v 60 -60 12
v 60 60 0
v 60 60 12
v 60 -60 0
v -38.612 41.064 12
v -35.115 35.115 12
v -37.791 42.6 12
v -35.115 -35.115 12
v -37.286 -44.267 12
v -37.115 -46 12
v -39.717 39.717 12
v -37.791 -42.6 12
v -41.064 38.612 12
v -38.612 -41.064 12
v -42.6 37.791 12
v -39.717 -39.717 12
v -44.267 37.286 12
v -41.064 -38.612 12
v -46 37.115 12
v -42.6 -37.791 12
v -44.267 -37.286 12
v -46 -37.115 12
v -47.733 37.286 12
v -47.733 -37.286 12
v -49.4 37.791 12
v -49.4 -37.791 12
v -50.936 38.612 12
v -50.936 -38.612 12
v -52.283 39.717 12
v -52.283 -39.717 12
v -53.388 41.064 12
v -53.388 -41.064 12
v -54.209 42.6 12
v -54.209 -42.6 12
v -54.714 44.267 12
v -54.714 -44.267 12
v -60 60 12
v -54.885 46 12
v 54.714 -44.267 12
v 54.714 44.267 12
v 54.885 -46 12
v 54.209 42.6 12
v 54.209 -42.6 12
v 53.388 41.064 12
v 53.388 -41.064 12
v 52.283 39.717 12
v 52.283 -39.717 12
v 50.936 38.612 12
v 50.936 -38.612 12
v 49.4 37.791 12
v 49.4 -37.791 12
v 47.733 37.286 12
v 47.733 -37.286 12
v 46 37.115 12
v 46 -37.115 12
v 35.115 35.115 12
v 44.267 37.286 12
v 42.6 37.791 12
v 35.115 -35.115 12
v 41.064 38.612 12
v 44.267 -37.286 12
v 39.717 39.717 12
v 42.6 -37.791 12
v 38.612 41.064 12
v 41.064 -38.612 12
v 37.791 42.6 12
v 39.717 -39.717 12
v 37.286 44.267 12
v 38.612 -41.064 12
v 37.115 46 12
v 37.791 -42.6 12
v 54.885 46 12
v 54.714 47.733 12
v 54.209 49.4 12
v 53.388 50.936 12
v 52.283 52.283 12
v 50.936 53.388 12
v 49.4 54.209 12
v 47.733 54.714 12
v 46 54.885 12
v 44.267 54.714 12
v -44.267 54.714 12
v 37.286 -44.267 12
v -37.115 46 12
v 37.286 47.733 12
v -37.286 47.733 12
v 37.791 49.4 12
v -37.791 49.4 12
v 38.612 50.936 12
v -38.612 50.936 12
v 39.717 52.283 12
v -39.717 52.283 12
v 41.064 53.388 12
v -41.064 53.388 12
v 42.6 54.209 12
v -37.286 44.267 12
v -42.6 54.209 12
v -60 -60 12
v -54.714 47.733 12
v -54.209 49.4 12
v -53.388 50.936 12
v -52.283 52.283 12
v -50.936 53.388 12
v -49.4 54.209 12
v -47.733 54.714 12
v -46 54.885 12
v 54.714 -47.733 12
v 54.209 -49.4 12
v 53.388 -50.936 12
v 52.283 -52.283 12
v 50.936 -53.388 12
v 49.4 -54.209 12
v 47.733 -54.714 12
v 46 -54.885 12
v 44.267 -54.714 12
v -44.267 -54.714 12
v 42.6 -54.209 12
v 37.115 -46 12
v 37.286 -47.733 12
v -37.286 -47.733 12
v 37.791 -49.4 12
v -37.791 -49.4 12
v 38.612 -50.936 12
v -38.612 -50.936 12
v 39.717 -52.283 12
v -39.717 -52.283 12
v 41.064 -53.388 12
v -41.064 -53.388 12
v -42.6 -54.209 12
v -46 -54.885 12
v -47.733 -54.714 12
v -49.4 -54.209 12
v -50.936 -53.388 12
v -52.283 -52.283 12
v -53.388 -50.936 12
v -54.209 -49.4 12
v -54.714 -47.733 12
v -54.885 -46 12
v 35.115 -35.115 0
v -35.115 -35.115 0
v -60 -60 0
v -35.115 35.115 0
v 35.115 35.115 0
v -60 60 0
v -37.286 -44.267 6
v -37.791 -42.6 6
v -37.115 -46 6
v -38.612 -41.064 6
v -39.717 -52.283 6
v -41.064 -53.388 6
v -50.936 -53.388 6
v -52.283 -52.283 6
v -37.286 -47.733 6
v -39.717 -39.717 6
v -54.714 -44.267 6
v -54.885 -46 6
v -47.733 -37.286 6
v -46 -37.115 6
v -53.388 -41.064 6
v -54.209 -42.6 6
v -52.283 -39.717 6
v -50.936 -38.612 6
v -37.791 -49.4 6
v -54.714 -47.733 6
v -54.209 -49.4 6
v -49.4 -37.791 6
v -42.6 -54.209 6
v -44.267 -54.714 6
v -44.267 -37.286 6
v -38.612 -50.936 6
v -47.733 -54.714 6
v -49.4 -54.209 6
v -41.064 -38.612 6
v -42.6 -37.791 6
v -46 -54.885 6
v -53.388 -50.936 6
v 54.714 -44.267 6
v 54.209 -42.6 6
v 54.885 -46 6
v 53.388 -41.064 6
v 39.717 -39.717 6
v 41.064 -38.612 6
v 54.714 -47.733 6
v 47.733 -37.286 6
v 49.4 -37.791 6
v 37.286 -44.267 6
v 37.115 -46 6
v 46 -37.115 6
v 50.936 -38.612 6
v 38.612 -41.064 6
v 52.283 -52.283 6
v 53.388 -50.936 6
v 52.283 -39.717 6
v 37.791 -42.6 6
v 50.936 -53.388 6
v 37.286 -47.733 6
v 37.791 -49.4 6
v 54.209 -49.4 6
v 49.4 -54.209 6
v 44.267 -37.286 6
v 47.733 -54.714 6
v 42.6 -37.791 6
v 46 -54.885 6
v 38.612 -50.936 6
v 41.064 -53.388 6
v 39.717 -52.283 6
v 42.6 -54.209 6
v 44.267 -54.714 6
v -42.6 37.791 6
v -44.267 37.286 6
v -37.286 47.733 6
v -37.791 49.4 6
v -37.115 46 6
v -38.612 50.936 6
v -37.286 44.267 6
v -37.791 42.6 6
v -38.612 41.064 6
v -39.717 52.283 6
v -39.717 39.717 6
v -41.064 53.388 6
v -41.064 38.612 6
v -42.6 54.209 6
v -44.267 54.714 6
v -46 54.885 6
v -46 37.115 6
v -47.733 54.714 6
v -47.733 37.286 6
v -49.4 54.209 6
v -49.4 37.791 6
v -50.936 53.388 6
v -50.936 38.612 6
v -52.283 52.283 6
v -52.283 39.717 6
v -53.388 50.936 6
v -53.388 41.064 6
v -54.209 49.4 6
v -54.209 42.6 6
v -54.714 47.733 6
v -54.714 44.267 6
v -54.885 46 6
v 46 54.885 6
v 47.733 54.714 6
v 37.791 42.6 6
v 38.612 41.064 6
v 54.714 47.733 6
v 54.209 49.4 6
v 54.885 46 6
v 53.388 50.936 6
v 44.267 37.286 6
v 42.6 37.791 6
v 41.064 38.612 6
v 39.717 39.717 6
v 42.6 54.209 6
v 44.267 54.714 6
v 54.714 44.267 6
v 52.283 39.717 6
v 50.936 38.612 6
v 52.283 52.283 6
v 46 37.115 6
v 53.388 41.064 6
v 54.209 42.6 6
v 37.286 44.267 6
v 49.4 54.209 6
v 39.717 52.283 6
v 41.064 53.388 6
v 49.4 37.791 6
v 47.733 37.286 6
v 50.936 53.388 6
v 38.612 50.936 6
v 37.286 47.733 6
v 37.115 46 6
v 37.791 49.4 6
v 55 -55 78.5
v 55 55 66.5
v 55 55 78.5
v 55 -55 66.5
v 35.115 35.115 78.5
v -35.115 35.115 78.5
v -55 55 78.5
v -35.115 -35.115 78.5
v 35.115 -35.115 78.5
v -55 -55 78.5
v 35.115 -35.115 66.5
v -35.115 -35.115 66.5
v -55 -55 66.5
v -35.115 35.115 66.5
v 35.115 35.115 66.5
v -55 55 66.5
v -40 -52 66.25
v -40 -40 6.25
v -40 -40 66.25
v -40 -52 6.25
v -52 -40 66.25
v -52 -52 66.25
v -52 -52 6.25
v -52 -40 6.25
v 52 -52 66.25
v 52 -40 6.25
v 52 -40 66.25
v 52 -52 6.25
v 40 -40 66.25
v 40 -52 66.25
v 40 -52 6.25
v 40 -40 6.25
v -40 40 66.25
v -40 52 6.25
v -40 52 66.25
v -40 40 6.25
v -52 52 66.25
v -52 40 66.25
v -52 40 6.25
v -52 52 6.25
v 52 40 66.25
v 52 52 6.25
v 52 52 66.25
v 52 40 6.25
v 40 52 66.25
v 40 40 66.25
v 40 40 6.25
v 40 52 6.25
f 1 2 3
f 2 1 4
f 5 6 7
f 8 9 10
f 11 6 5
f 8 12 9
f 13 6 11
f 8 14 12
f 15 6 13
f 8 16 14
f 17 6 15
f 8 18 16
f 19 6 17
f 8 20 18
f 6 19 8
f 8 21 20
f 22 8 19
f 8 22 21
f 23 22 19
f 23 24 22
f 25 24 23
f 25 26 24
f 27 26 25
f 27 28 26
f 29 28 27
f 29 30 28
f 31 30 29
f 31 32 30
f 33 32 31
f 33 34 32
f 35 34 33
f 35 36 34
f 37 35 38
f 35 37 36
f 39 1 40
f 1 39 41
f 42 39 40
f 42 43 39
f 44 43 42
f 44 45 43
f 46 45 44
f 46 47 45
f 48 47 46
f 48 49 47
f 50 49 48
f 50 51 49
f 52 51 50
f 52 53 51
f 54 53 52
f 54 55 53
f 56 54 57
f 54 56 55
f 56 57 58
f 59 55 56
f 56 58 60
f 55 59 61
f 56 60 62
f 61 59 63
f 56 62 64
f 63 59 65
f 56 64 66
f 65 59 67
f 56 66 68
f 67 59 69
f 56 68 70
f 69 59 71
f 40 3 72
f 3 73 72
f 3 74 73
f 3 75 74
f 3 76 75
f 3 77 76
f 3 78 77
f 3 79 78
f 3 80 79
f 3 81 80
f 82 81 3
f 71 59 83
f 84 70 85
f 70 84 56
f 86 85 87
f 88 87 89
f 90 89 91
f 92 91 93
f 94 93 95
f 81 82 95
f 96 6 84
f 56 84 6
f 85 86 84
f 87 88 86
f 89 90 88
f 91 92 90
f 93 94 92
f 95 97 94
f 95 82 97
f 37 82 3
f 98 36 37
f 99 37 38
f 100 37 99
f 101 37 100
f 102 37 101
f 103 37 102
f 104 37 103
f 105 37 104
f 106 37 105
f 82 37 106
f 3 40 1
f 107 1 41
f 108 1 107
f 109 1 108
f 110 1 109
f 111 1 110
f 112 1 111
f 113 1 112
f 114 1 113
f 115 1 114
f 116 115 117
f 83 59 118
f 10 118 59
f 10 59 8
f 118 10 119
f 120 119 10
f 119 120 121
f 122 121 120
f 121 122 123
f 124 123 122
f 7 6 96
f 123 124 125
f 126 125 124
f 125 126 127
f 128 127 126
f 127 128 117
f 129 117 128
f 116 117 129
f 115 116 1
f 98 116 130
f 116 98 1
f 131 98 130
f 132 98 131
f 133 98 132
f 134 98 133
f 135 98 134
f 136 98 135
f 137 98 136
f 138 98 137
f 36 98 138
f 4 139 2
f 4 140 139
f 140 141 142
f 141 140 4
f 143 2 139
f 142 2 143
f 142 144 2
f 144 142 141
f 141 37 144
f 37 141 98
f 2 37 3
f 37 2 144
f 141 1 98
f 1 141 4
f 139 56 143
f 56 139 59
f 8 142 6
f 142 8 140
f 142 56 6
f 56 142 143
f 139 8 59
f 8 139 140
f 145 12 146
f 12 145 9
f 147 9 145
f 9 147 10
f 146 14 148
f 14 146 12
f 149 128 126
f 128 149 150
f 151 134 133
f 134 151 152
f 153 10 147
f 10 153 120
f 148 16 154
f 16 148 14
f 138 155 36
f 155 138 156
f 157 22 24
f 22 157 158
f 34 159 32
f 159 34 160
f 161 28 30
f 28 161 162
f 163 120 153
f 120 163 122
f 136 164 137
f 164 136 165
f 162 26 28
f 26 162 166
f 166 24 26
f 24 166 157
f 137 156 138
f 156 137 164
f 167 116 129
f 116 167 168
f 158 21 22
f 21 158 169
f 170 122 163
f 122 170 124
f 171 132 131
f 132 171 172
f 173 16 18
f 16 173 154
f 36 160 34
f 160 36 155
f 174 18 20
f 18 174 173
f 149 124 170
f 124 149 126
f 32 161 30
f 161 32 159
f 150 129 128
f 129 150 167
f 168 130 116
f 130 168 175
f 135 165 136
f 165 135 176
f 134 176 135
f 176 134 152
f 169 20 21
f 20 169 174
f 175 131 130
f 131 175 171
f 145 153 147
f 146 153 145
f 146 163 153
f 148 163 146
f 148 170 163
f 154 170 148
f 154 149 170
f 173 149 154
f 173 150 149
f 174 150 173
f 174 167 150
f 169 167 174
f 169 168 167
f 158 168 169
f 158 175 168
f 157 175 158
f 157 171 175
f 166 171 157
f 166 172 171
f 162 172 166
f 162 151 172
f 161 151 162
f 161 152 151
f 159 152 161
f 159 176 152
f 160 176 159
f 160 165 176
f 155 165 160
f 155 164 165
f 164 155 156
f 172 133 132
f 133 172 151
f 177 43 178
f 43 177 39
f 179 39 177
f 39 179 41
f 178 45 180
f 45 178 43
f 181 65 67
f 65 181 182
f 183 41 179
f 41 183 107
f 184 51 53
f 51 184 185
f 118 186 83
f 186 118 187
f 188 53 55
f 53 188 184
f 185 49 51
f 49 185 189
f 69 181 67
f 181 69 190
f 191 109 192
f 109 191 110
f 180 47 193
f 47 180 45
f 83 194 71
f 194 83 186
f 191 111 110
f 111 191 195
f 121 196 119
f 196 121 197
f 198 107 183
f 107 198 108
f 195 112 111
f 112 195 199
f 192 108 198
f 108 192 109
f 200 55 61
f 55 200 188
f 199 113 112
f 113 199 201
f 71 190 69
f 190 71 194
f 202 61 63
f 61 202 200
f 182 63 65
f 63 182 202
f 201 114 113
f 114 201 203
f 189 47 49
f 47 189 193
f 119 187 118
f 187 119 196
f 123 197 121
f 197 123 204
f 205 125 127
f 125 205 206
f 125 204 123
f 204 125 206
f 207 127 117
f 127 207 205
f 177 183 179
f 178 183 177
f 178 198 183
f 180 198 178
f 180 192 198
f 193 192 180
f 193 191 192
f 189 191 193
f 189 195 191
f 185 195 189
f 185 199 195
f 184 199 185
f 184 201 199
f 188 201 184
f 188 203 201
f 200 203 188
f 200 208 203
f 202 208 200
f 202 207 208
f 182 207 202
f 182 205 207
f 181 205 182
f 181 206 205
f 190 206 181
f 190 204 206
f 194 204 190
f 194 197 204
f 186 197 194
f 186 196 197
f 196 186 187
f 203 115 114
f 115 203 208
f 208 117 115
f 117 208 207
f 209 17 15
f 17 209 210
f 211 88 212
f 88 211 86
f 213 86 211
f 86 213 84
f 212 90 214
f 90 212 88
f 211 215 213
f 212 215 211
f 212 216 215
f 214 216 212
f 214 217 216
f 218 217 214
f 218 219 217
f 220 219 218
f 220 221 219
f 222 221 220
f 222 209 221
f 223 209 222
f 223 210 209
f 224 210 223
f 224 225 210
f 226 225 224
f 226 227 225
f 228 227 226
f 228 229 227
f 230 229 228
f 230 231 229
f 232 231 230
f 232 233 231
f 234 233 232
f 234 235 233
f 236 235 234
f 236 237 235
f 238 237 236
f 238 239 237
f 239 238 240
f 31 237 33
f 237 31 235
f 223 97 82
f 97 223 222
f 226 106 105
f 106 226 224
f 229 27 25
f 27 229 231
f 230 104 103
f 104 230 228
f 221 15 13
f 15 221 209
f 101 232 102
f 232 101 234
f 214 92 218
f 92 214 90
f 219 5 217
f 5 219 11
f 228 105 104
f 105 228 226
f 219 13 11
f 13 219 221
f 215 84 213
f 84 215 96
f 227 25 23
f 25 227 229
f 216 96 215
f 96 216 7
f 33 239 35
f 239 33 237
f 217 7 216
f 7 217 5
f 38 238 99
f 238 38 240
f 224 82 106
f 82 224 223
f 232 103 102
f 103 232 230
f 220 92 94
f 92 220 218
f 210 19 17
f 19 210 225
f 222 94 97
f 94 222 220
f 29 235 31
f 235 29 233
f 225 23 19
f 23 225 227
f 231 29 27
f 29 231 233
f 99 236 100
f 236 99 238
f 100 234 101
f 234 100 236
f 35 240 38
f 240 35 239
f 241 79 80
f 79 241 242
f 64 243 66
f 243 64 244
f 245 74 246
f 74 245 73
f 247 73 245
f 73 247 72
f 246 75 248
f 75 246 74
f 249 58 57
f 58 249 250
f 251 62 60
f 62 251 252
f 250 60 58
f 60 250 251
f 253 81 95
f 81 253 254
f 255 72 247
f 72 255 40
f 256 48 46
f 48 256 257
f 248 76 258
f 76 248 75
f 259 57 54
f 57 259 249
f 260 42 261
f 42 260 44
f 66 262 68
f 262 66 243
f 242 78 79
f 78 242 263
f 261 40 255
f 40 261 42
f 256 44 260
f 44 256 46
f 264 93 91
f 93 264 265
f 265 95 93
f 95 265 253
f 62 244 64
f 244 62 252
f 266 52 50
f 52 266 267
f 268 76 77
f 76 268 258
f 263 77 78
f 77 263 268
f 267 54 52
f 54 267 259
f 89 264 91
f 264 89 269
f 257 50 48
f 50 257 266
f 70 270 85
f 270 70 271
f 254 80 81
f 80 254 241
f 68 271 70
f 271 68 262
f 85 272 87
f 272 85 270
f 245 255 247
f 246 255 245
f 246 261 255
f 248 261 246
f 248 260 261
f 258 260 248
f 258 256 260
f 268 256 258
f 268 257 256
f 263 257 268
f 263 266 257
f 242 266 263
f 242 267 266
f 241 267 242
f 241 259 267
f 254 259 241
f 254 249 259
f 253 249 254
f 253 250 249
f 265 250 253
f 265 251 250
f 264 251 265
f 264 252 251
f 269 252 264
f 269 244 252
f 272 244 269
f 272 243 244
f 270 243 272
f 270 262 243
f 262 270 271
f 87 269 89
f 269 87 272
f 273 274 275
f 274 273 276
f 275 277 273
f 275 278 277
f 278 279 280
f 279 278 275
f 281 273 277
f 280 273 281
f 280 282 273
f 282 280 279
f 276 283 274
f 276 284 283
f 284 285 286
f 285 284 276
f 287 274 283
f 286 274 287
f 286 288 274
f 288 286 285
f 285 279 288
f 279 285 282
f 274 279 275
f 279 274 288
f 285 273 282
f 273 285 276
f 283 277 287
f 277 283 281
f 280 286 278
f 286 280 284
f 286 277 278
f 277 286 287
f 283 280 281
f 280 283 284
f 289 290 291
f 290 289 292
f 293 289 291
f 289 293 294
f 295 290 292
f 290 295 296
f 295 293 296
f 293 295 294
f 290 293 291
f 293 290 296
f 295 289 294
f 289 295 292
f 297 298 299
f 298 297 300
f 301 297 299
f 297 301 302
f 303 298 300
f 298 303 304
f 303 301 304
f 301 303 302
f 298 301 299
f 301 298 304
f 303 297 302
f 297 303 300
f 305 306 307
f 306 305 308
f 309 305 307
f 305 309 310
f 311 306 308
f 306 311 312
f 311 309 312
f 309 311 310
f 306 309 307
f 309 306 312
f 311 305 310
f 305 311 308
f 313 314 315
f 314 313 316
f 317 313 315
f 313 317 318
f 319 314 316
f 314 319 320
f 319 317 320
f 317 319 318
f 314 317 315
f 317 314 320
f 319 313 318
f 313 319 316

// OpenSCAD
$fn = 32;

// ------------------------------------------------------------------------
// Frame cube: base 120 x 120 mm, posts 60 mm tall
// Every part is its own module, assembly() places every instance.
// ------------------------------------------------------------------------

// --- part 1 ---
module base_frame() {
  difference() {
    translate([-60, -60, 0]) cube([120, 120, 12]);
    translate([-35.115, -35.115, -1]) cube([70.23, 70.23, 14]);
    translate([-46, -46, 6]) cylinder(h = 7, d = 17.77);
    translate([46, -46, 6]) cylinder(h = 7, d = 17.77);
    translate([-46, 46, 6]) cylinder(h = 7, d = 17.77);
    translate([46, 46, 6]) cylinder(h = 7, d = 17.77);
  }
}

// --- part 2 ---
module corner_post() {
  translate([-6, -6, 0]) cube([12, 12, 60]);
}

// --- part 3 ---
module top_frame() {
  difference() {
    translate([-55, -55, 0]) cube([110, 110, 12]);
    translate([-35.115, -35.115, -1]) cube([70.23, 70.23, 14]);
  }
}

// --- assembly ---
module assembly() {
  color([0.80, 0.24, 0.20]) translate([0, 0, 0]) rotate([0, 0, 0]) base_frame();
  color([0.20, 0.45, 0.75]) translate([-46, -46, 6.25]) rotate([0, 0, 0]) corner_post();
  color([0.25, 0.62, 0.32]) translate([46, -46, 6.25]) rotate([0, 0, 0]) corner_post();
  color([0.92, 0.70, 0.18]) translate([-46, 46, 6.25]) rotate([0, 0, 0]) corner_post();
  color([0.58, 0.35, 0.70]) translate([46, 46, 6.25]) rotate([0, 0, 0]) corner_post();
  color([0.16, 0.66, 0.66]) translate([0, 0, 66.5]) rotate([0, 0, 0]) top_frame();
}

assembly();
